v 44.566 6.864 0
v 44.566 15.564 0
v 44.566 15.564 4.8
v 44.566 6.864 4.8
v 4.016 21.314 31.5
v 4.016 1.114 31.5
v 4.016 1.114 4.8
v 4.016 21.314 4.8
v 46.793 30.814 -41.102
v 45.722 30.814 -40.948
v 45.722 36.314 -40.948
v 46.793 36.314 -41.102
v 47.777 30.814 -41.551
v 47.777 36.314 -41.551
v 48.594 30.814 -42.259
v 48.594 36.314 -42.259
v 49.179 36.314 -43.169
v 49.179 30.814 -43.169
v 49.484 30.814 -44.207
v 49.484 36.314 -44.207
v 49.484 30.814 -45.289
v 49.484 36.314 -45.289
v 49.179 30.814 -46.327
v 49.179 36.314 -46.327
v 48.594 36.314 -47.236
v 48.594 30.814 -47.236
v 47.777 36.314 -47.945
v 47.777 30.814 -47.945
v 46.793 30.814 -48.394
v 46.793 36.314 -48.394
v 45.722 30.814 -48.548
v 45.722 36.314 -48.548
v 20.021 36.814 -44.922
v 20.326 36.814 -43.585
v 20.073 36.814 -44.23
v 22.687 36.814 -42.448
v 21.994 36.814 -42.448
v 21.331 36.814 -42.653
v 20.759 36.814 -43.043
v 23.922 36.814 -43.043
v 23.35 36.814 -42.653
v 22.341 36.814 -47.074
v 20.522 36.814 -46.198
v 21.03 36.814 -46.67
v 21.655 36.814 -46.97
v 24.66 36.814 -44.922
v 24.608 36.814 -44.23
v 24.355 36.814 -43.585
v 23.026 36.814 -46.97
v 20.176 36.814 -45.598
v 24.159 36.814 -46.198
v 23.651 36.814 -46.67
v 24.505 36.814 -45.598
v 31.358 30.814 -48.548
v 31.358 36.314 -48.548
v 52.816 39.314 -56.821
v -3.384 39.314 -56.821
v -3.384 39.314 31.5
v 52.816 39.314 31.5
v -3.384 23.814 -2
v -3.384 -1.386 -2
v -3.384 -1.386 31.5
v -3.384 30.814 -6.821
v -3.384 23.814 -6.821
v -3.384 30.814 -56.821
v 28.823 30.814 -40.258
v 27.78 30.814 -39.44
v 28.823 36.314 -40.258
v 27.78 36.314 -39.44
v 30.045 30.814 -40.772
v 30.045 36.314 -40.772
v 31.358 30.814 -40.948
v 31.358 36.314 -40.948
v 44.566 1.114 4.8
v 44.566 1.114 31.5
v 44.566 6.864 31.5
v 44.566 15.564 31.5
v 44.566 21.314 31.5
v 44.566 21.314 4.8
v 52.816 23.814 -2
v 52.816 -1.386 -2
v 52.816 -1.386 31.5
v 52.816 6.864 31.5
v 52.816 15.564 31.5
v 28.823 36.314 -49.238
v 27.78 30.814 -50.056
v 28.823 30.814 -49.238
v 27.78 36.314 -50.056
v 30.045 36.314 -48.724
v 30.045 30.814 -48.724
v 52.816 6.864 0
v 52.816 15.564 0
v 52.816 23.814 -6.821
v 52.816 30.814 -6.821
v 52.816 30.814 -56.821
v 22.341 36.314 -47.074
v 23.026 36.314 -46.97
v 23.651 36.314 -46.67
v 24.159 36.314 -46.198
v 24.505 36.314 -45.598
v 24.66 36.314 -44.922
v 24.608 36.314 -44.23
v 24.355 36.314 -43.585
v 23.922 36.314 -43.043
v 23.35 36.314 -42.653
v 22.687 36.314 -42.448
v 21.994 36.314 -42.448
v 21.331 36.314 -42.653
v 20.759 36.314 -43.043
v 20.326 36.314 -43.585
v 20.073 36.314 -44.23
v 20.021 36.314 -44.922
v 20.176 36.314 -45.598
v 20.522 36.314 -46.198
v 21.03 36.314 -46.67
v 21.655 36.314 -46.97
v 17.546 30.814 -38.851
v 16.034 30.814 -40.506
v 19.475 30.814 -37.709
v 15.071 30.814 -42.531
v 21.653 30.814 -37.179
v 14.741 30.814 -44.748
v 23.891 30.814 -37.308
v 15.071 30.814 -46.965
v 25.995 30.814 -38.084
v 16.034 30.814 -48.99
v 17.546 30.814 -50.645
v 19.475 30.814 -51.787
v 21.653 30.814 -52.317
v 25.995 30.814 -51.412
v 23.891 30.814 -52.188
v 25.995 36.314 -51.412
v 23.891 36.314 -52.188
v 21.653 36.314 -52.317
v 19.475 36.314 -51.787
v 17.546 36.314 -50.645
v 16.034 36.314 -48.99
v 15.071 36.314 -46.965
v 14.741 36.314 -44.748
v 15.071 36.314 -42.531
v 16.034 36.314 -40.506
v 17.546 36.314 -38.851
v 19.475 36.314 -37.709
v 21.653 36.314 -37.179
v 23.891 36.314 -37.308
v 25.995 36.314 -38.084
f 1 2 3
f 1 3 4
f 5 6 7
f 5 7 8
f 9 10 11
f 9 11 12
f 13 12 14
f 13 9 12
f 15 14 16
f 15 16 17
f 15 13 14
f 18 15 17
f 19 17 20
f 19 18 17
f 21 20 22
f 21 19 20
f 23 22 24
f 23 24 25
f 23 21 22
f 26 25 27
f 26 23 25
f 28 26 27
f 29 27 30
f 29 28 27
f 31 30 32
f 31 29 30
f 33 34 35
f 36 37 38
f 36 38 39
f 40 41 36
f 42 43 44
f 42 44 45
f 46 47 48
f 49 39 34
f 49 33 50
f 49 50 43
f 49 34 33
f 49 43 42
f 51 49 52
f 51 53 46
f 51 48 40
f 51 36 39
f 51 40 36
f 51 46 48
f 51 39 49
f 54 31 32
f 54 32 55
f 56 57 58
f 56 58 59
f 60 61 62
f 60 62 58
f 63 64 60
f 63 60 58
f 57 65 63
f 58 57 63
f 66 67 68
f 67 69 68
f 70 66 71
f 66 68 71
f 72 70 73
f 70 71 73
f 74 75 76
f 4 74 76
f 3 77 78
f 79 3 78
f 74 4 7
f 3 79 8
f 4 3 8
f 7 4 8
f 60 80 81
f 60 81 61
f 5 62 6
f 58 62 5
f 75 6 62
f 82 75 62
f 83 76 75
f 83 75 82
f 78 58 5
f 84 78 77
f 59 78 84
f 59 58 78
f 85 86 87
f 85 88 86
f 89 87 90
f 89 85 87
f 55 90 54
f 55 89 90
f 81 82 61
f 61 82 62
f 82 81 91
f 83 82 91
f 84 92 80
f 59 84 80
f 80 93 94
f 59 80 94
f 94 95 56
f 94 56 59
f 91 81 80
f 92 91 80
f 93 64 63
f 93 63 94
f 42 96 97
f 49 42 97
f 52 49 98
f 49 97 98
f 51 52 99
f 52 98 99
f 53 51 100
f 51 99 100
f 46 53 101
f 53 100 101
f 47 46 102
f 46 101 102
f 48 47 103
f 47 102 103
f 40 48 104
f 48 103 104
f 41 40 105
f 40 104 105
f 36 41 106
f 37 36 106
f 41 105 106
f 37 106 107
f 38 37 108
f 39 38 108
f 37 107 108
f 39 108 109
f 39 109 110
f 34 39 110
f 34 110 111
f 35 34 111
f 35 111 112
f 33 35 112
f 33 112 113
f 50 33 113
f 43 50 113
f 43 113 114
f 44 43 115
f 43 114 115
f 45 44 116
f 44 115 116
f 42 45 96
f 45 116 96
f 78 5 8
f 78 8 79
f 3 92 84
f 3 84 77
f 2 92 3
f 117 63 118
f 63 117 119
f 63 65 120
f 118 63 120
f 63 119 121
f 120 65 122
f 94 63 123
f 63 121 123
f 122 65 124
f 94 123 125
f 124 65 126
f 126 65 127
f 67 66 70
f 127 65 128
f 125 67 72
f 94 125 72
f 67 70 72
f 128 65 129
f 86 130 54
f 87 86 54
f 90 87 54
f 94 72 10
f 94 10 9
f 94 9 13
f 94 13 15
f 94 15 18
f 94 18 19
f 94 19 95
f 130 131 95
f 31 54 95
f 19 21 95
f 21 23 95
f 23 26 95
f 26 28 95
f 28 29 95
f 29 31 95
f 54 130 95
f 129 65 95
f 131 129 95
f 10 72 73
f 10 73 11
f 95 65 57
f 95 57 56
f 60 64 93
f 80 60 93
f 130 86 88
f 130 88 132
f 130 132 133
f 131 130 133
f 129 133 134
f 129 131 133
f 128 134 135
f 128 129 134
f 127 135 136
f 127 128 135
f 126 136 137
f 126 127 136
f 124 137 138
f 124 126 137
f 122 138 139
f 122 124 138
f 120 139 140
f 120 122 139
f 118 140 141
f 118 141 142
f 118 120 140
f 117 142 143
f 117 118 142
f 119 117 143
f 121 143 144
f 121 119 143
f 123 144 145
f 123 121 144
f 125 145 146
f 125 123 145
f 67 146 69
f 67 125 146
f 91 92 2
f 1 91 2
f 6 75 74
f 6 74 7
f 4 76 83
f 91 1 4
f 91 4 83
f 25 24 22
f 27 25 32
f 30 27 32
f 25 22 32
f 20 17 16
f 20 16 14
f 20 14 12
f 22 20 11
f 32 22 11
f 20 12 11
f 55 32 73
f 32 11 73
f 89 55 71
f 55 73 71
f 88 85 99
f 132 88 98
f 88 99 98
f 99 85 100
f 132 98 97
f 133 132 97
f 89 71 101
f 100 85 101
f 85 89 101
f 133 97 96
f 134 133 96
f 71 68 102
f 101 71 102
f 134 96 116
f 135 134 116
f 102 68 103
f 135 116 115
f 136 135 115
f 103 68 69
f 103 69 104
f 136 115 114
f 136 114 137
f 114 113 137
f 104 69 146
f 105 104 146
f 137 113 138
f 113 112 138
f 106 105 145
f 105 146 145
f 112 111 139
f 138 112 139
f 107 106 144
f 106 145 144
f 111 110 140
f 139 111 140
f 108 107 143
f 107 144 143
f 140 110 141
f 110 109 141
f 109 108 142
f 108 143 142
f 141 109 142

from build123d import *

# Parameters (mm, degrees)
BOSS_EXTRUDE1_DEPTH = 31.5
CUT_EXTRUDE1_DEPTH  = 26.7
SKETCH3_W           = 56.2
SKETCH3_H           = 25.2
BOSS_EXTRUDE2_DEPTH = 2
SKETCH5_W           = 56.2
SKETCH5_H           = 20
BOSS_EXTRUDE4_DEPTH = 7
SKETCH6_W           = 56.2
SKETCH6_H           = 60
BOSS_EXTRUDE5_DEPTH = 8.5
CUT_EXTRUDE2_DEPTH  = 5.5
SKETCH11_R          = 2.32571443
CUT_EXTRUDE3_DEPTH  = 0.5
SKETCH12_W          = 56.2
SKETCH12_H          = 7
BOSS_EXTRUDE8_DEPTH = 18.321145389
SKETCH18_W          = 56.2
SKETCH18_H          = 8.5
BOSS_EXTRUDE9_DEPTH = 28.321145389
FILLET5_R           = 5


with BuildPart() as part:
    # Sketch1 → Boss-Extrude1 (new body)
    with BuildSketch(Plane.XY):
        Polygon((-3.384140796, -1.386438558), (-3.384140796, 23.813561442), (52.815859204, 23.813561442), (52.815859204, 15.563561442), (44.565859204, 15.563561442), (44.565859204, 6.863561442), (52.815859204, 6.863561442), (52.815859204, -1.386438558), align=None)
    extrude(amount=BOSS_EXTRUDE1_DEPTH)

    # Sketch2 → Cut-Extrude1 (cut)
    with BuildSketch(Plane.XY.offset(31.5)):
        Polygon((4.015859204, 21.313561442), (44.565859204, 21.313561442), (44.565859204, 15.563561442), (44.565859204, 6.863561442), (44.565859204, 1.113561442), (4.015859204, 1.113561442), align=None)
    extrude(amount=-CUT_EXTRUDE1_DEPTH, mode=Mode.SUBTRACT)

    # Sketch3 → Boss-Extrude2 (add)
    with BuildSketch(Plane(origin=(0, 0, 0), x_dir=(-1, 0, 0), z_dir=(0, 0, -1))):
        with Locations((-24.715859204, 11.213561442)):
            Rectangle(SKETCH3_W, SKETCH3_H)
    extrude(amount=BOSS_EXTRUDE2_DEPTH)

    # Sketch5 → Boss-Extrude4 (add)
    with BuildSketch(Plane(origin=(0, 23.813561442, 0), x_dir=(1, 0, 0), z_dir=(0, 1, 0))):
        with Locations((24.715859204, -3.178854611)):
            Rectangle(SKETCH5_W, SKETCH5_H)
    extrude(amount=BOSS_EXTRUDE4_DEPTH)

    # Sketch6 → Boss-Extrude5 (add)
    with BuildSketch(Plane(origin=(0, 30.813561442, 0), x_dir=(1, 0, 0), z_dir=(0, 1, 0))):
        with Locations((24.715859204, 26.821145389)):
            Rectangle(SKETCH6_W, SKETCH6_H)
    extrude(amount=BOSS_EXTRUDE5_DEPTH)

    # Sketch10 → Cut-Extrude2 (cut)
    with BuildSketch(Plane.XZ.offset(-30.813561442)):
        with BuildLine():
            Line((28.922300324, -40.947940044), (45.722300324, -40.947940044))
            ThreePointArc((45.722300324, -40.947940044), (49.522300324, -44.747940044), (45.722300324, -48.547940044))
            Line((45.722300324, -48.547940044), (28.922300324, -48.547940044))
            ThreePointArc((28.922300324, -48.547940044), (14.740507255, -44.747940044), (28.922300324, -40.947940044))
        make_face()
    extrude(amount=-CUT_EXTRUDE2_DEPTH, mode=Mode.SUBTRACT)

    # Sketch11 → Cut-Extrude3 (cut)
    with BuildSketch(Plane.XZ.offset(-36.313561442)):
        with Locations(Location((22.340507255, -44.747940044, 0), (0, 0, 270))):
            Circle(SKETCH11_R)
    extrude(amount=-CUT_EXTRUDE3_DEPTH, mode=Mode.SUBTRACT)

    # Sketch12 → Boss-Extrude8 (add)
    with BuildSketch(Plane.XY.offset(13.178854611)):
        with Locations((24.715859204, 27.313561442)):
            Rectangle(SKETCH12_W, SKETCH12_H)
    extrude(amount=BOSS_EXTRUDE8_DEPTH)

    # Sketch18 → Boss-Extrude9 (add)
    with BuildSketch(Plane.XY.offset(3.178854611)):
        with Locations((24.715859204, 35.063561442)):
            Rectangle(SKETCH18_W, SKETCH18_H)
    extrude(amount=BOSS_EXTRUDE9_DEPTH)

    # Fillet5
    fillet5_edges = [part.edges().sort_by_distance(p)[0] for p in [
        (28.922300324, 33.563561442, -48.547940044),
        (28.922300324, 33.563561442, -40.947940044),
    ]]
    fillet(fillet5_edges, radius=FILLET5_R)


solid = part.part
